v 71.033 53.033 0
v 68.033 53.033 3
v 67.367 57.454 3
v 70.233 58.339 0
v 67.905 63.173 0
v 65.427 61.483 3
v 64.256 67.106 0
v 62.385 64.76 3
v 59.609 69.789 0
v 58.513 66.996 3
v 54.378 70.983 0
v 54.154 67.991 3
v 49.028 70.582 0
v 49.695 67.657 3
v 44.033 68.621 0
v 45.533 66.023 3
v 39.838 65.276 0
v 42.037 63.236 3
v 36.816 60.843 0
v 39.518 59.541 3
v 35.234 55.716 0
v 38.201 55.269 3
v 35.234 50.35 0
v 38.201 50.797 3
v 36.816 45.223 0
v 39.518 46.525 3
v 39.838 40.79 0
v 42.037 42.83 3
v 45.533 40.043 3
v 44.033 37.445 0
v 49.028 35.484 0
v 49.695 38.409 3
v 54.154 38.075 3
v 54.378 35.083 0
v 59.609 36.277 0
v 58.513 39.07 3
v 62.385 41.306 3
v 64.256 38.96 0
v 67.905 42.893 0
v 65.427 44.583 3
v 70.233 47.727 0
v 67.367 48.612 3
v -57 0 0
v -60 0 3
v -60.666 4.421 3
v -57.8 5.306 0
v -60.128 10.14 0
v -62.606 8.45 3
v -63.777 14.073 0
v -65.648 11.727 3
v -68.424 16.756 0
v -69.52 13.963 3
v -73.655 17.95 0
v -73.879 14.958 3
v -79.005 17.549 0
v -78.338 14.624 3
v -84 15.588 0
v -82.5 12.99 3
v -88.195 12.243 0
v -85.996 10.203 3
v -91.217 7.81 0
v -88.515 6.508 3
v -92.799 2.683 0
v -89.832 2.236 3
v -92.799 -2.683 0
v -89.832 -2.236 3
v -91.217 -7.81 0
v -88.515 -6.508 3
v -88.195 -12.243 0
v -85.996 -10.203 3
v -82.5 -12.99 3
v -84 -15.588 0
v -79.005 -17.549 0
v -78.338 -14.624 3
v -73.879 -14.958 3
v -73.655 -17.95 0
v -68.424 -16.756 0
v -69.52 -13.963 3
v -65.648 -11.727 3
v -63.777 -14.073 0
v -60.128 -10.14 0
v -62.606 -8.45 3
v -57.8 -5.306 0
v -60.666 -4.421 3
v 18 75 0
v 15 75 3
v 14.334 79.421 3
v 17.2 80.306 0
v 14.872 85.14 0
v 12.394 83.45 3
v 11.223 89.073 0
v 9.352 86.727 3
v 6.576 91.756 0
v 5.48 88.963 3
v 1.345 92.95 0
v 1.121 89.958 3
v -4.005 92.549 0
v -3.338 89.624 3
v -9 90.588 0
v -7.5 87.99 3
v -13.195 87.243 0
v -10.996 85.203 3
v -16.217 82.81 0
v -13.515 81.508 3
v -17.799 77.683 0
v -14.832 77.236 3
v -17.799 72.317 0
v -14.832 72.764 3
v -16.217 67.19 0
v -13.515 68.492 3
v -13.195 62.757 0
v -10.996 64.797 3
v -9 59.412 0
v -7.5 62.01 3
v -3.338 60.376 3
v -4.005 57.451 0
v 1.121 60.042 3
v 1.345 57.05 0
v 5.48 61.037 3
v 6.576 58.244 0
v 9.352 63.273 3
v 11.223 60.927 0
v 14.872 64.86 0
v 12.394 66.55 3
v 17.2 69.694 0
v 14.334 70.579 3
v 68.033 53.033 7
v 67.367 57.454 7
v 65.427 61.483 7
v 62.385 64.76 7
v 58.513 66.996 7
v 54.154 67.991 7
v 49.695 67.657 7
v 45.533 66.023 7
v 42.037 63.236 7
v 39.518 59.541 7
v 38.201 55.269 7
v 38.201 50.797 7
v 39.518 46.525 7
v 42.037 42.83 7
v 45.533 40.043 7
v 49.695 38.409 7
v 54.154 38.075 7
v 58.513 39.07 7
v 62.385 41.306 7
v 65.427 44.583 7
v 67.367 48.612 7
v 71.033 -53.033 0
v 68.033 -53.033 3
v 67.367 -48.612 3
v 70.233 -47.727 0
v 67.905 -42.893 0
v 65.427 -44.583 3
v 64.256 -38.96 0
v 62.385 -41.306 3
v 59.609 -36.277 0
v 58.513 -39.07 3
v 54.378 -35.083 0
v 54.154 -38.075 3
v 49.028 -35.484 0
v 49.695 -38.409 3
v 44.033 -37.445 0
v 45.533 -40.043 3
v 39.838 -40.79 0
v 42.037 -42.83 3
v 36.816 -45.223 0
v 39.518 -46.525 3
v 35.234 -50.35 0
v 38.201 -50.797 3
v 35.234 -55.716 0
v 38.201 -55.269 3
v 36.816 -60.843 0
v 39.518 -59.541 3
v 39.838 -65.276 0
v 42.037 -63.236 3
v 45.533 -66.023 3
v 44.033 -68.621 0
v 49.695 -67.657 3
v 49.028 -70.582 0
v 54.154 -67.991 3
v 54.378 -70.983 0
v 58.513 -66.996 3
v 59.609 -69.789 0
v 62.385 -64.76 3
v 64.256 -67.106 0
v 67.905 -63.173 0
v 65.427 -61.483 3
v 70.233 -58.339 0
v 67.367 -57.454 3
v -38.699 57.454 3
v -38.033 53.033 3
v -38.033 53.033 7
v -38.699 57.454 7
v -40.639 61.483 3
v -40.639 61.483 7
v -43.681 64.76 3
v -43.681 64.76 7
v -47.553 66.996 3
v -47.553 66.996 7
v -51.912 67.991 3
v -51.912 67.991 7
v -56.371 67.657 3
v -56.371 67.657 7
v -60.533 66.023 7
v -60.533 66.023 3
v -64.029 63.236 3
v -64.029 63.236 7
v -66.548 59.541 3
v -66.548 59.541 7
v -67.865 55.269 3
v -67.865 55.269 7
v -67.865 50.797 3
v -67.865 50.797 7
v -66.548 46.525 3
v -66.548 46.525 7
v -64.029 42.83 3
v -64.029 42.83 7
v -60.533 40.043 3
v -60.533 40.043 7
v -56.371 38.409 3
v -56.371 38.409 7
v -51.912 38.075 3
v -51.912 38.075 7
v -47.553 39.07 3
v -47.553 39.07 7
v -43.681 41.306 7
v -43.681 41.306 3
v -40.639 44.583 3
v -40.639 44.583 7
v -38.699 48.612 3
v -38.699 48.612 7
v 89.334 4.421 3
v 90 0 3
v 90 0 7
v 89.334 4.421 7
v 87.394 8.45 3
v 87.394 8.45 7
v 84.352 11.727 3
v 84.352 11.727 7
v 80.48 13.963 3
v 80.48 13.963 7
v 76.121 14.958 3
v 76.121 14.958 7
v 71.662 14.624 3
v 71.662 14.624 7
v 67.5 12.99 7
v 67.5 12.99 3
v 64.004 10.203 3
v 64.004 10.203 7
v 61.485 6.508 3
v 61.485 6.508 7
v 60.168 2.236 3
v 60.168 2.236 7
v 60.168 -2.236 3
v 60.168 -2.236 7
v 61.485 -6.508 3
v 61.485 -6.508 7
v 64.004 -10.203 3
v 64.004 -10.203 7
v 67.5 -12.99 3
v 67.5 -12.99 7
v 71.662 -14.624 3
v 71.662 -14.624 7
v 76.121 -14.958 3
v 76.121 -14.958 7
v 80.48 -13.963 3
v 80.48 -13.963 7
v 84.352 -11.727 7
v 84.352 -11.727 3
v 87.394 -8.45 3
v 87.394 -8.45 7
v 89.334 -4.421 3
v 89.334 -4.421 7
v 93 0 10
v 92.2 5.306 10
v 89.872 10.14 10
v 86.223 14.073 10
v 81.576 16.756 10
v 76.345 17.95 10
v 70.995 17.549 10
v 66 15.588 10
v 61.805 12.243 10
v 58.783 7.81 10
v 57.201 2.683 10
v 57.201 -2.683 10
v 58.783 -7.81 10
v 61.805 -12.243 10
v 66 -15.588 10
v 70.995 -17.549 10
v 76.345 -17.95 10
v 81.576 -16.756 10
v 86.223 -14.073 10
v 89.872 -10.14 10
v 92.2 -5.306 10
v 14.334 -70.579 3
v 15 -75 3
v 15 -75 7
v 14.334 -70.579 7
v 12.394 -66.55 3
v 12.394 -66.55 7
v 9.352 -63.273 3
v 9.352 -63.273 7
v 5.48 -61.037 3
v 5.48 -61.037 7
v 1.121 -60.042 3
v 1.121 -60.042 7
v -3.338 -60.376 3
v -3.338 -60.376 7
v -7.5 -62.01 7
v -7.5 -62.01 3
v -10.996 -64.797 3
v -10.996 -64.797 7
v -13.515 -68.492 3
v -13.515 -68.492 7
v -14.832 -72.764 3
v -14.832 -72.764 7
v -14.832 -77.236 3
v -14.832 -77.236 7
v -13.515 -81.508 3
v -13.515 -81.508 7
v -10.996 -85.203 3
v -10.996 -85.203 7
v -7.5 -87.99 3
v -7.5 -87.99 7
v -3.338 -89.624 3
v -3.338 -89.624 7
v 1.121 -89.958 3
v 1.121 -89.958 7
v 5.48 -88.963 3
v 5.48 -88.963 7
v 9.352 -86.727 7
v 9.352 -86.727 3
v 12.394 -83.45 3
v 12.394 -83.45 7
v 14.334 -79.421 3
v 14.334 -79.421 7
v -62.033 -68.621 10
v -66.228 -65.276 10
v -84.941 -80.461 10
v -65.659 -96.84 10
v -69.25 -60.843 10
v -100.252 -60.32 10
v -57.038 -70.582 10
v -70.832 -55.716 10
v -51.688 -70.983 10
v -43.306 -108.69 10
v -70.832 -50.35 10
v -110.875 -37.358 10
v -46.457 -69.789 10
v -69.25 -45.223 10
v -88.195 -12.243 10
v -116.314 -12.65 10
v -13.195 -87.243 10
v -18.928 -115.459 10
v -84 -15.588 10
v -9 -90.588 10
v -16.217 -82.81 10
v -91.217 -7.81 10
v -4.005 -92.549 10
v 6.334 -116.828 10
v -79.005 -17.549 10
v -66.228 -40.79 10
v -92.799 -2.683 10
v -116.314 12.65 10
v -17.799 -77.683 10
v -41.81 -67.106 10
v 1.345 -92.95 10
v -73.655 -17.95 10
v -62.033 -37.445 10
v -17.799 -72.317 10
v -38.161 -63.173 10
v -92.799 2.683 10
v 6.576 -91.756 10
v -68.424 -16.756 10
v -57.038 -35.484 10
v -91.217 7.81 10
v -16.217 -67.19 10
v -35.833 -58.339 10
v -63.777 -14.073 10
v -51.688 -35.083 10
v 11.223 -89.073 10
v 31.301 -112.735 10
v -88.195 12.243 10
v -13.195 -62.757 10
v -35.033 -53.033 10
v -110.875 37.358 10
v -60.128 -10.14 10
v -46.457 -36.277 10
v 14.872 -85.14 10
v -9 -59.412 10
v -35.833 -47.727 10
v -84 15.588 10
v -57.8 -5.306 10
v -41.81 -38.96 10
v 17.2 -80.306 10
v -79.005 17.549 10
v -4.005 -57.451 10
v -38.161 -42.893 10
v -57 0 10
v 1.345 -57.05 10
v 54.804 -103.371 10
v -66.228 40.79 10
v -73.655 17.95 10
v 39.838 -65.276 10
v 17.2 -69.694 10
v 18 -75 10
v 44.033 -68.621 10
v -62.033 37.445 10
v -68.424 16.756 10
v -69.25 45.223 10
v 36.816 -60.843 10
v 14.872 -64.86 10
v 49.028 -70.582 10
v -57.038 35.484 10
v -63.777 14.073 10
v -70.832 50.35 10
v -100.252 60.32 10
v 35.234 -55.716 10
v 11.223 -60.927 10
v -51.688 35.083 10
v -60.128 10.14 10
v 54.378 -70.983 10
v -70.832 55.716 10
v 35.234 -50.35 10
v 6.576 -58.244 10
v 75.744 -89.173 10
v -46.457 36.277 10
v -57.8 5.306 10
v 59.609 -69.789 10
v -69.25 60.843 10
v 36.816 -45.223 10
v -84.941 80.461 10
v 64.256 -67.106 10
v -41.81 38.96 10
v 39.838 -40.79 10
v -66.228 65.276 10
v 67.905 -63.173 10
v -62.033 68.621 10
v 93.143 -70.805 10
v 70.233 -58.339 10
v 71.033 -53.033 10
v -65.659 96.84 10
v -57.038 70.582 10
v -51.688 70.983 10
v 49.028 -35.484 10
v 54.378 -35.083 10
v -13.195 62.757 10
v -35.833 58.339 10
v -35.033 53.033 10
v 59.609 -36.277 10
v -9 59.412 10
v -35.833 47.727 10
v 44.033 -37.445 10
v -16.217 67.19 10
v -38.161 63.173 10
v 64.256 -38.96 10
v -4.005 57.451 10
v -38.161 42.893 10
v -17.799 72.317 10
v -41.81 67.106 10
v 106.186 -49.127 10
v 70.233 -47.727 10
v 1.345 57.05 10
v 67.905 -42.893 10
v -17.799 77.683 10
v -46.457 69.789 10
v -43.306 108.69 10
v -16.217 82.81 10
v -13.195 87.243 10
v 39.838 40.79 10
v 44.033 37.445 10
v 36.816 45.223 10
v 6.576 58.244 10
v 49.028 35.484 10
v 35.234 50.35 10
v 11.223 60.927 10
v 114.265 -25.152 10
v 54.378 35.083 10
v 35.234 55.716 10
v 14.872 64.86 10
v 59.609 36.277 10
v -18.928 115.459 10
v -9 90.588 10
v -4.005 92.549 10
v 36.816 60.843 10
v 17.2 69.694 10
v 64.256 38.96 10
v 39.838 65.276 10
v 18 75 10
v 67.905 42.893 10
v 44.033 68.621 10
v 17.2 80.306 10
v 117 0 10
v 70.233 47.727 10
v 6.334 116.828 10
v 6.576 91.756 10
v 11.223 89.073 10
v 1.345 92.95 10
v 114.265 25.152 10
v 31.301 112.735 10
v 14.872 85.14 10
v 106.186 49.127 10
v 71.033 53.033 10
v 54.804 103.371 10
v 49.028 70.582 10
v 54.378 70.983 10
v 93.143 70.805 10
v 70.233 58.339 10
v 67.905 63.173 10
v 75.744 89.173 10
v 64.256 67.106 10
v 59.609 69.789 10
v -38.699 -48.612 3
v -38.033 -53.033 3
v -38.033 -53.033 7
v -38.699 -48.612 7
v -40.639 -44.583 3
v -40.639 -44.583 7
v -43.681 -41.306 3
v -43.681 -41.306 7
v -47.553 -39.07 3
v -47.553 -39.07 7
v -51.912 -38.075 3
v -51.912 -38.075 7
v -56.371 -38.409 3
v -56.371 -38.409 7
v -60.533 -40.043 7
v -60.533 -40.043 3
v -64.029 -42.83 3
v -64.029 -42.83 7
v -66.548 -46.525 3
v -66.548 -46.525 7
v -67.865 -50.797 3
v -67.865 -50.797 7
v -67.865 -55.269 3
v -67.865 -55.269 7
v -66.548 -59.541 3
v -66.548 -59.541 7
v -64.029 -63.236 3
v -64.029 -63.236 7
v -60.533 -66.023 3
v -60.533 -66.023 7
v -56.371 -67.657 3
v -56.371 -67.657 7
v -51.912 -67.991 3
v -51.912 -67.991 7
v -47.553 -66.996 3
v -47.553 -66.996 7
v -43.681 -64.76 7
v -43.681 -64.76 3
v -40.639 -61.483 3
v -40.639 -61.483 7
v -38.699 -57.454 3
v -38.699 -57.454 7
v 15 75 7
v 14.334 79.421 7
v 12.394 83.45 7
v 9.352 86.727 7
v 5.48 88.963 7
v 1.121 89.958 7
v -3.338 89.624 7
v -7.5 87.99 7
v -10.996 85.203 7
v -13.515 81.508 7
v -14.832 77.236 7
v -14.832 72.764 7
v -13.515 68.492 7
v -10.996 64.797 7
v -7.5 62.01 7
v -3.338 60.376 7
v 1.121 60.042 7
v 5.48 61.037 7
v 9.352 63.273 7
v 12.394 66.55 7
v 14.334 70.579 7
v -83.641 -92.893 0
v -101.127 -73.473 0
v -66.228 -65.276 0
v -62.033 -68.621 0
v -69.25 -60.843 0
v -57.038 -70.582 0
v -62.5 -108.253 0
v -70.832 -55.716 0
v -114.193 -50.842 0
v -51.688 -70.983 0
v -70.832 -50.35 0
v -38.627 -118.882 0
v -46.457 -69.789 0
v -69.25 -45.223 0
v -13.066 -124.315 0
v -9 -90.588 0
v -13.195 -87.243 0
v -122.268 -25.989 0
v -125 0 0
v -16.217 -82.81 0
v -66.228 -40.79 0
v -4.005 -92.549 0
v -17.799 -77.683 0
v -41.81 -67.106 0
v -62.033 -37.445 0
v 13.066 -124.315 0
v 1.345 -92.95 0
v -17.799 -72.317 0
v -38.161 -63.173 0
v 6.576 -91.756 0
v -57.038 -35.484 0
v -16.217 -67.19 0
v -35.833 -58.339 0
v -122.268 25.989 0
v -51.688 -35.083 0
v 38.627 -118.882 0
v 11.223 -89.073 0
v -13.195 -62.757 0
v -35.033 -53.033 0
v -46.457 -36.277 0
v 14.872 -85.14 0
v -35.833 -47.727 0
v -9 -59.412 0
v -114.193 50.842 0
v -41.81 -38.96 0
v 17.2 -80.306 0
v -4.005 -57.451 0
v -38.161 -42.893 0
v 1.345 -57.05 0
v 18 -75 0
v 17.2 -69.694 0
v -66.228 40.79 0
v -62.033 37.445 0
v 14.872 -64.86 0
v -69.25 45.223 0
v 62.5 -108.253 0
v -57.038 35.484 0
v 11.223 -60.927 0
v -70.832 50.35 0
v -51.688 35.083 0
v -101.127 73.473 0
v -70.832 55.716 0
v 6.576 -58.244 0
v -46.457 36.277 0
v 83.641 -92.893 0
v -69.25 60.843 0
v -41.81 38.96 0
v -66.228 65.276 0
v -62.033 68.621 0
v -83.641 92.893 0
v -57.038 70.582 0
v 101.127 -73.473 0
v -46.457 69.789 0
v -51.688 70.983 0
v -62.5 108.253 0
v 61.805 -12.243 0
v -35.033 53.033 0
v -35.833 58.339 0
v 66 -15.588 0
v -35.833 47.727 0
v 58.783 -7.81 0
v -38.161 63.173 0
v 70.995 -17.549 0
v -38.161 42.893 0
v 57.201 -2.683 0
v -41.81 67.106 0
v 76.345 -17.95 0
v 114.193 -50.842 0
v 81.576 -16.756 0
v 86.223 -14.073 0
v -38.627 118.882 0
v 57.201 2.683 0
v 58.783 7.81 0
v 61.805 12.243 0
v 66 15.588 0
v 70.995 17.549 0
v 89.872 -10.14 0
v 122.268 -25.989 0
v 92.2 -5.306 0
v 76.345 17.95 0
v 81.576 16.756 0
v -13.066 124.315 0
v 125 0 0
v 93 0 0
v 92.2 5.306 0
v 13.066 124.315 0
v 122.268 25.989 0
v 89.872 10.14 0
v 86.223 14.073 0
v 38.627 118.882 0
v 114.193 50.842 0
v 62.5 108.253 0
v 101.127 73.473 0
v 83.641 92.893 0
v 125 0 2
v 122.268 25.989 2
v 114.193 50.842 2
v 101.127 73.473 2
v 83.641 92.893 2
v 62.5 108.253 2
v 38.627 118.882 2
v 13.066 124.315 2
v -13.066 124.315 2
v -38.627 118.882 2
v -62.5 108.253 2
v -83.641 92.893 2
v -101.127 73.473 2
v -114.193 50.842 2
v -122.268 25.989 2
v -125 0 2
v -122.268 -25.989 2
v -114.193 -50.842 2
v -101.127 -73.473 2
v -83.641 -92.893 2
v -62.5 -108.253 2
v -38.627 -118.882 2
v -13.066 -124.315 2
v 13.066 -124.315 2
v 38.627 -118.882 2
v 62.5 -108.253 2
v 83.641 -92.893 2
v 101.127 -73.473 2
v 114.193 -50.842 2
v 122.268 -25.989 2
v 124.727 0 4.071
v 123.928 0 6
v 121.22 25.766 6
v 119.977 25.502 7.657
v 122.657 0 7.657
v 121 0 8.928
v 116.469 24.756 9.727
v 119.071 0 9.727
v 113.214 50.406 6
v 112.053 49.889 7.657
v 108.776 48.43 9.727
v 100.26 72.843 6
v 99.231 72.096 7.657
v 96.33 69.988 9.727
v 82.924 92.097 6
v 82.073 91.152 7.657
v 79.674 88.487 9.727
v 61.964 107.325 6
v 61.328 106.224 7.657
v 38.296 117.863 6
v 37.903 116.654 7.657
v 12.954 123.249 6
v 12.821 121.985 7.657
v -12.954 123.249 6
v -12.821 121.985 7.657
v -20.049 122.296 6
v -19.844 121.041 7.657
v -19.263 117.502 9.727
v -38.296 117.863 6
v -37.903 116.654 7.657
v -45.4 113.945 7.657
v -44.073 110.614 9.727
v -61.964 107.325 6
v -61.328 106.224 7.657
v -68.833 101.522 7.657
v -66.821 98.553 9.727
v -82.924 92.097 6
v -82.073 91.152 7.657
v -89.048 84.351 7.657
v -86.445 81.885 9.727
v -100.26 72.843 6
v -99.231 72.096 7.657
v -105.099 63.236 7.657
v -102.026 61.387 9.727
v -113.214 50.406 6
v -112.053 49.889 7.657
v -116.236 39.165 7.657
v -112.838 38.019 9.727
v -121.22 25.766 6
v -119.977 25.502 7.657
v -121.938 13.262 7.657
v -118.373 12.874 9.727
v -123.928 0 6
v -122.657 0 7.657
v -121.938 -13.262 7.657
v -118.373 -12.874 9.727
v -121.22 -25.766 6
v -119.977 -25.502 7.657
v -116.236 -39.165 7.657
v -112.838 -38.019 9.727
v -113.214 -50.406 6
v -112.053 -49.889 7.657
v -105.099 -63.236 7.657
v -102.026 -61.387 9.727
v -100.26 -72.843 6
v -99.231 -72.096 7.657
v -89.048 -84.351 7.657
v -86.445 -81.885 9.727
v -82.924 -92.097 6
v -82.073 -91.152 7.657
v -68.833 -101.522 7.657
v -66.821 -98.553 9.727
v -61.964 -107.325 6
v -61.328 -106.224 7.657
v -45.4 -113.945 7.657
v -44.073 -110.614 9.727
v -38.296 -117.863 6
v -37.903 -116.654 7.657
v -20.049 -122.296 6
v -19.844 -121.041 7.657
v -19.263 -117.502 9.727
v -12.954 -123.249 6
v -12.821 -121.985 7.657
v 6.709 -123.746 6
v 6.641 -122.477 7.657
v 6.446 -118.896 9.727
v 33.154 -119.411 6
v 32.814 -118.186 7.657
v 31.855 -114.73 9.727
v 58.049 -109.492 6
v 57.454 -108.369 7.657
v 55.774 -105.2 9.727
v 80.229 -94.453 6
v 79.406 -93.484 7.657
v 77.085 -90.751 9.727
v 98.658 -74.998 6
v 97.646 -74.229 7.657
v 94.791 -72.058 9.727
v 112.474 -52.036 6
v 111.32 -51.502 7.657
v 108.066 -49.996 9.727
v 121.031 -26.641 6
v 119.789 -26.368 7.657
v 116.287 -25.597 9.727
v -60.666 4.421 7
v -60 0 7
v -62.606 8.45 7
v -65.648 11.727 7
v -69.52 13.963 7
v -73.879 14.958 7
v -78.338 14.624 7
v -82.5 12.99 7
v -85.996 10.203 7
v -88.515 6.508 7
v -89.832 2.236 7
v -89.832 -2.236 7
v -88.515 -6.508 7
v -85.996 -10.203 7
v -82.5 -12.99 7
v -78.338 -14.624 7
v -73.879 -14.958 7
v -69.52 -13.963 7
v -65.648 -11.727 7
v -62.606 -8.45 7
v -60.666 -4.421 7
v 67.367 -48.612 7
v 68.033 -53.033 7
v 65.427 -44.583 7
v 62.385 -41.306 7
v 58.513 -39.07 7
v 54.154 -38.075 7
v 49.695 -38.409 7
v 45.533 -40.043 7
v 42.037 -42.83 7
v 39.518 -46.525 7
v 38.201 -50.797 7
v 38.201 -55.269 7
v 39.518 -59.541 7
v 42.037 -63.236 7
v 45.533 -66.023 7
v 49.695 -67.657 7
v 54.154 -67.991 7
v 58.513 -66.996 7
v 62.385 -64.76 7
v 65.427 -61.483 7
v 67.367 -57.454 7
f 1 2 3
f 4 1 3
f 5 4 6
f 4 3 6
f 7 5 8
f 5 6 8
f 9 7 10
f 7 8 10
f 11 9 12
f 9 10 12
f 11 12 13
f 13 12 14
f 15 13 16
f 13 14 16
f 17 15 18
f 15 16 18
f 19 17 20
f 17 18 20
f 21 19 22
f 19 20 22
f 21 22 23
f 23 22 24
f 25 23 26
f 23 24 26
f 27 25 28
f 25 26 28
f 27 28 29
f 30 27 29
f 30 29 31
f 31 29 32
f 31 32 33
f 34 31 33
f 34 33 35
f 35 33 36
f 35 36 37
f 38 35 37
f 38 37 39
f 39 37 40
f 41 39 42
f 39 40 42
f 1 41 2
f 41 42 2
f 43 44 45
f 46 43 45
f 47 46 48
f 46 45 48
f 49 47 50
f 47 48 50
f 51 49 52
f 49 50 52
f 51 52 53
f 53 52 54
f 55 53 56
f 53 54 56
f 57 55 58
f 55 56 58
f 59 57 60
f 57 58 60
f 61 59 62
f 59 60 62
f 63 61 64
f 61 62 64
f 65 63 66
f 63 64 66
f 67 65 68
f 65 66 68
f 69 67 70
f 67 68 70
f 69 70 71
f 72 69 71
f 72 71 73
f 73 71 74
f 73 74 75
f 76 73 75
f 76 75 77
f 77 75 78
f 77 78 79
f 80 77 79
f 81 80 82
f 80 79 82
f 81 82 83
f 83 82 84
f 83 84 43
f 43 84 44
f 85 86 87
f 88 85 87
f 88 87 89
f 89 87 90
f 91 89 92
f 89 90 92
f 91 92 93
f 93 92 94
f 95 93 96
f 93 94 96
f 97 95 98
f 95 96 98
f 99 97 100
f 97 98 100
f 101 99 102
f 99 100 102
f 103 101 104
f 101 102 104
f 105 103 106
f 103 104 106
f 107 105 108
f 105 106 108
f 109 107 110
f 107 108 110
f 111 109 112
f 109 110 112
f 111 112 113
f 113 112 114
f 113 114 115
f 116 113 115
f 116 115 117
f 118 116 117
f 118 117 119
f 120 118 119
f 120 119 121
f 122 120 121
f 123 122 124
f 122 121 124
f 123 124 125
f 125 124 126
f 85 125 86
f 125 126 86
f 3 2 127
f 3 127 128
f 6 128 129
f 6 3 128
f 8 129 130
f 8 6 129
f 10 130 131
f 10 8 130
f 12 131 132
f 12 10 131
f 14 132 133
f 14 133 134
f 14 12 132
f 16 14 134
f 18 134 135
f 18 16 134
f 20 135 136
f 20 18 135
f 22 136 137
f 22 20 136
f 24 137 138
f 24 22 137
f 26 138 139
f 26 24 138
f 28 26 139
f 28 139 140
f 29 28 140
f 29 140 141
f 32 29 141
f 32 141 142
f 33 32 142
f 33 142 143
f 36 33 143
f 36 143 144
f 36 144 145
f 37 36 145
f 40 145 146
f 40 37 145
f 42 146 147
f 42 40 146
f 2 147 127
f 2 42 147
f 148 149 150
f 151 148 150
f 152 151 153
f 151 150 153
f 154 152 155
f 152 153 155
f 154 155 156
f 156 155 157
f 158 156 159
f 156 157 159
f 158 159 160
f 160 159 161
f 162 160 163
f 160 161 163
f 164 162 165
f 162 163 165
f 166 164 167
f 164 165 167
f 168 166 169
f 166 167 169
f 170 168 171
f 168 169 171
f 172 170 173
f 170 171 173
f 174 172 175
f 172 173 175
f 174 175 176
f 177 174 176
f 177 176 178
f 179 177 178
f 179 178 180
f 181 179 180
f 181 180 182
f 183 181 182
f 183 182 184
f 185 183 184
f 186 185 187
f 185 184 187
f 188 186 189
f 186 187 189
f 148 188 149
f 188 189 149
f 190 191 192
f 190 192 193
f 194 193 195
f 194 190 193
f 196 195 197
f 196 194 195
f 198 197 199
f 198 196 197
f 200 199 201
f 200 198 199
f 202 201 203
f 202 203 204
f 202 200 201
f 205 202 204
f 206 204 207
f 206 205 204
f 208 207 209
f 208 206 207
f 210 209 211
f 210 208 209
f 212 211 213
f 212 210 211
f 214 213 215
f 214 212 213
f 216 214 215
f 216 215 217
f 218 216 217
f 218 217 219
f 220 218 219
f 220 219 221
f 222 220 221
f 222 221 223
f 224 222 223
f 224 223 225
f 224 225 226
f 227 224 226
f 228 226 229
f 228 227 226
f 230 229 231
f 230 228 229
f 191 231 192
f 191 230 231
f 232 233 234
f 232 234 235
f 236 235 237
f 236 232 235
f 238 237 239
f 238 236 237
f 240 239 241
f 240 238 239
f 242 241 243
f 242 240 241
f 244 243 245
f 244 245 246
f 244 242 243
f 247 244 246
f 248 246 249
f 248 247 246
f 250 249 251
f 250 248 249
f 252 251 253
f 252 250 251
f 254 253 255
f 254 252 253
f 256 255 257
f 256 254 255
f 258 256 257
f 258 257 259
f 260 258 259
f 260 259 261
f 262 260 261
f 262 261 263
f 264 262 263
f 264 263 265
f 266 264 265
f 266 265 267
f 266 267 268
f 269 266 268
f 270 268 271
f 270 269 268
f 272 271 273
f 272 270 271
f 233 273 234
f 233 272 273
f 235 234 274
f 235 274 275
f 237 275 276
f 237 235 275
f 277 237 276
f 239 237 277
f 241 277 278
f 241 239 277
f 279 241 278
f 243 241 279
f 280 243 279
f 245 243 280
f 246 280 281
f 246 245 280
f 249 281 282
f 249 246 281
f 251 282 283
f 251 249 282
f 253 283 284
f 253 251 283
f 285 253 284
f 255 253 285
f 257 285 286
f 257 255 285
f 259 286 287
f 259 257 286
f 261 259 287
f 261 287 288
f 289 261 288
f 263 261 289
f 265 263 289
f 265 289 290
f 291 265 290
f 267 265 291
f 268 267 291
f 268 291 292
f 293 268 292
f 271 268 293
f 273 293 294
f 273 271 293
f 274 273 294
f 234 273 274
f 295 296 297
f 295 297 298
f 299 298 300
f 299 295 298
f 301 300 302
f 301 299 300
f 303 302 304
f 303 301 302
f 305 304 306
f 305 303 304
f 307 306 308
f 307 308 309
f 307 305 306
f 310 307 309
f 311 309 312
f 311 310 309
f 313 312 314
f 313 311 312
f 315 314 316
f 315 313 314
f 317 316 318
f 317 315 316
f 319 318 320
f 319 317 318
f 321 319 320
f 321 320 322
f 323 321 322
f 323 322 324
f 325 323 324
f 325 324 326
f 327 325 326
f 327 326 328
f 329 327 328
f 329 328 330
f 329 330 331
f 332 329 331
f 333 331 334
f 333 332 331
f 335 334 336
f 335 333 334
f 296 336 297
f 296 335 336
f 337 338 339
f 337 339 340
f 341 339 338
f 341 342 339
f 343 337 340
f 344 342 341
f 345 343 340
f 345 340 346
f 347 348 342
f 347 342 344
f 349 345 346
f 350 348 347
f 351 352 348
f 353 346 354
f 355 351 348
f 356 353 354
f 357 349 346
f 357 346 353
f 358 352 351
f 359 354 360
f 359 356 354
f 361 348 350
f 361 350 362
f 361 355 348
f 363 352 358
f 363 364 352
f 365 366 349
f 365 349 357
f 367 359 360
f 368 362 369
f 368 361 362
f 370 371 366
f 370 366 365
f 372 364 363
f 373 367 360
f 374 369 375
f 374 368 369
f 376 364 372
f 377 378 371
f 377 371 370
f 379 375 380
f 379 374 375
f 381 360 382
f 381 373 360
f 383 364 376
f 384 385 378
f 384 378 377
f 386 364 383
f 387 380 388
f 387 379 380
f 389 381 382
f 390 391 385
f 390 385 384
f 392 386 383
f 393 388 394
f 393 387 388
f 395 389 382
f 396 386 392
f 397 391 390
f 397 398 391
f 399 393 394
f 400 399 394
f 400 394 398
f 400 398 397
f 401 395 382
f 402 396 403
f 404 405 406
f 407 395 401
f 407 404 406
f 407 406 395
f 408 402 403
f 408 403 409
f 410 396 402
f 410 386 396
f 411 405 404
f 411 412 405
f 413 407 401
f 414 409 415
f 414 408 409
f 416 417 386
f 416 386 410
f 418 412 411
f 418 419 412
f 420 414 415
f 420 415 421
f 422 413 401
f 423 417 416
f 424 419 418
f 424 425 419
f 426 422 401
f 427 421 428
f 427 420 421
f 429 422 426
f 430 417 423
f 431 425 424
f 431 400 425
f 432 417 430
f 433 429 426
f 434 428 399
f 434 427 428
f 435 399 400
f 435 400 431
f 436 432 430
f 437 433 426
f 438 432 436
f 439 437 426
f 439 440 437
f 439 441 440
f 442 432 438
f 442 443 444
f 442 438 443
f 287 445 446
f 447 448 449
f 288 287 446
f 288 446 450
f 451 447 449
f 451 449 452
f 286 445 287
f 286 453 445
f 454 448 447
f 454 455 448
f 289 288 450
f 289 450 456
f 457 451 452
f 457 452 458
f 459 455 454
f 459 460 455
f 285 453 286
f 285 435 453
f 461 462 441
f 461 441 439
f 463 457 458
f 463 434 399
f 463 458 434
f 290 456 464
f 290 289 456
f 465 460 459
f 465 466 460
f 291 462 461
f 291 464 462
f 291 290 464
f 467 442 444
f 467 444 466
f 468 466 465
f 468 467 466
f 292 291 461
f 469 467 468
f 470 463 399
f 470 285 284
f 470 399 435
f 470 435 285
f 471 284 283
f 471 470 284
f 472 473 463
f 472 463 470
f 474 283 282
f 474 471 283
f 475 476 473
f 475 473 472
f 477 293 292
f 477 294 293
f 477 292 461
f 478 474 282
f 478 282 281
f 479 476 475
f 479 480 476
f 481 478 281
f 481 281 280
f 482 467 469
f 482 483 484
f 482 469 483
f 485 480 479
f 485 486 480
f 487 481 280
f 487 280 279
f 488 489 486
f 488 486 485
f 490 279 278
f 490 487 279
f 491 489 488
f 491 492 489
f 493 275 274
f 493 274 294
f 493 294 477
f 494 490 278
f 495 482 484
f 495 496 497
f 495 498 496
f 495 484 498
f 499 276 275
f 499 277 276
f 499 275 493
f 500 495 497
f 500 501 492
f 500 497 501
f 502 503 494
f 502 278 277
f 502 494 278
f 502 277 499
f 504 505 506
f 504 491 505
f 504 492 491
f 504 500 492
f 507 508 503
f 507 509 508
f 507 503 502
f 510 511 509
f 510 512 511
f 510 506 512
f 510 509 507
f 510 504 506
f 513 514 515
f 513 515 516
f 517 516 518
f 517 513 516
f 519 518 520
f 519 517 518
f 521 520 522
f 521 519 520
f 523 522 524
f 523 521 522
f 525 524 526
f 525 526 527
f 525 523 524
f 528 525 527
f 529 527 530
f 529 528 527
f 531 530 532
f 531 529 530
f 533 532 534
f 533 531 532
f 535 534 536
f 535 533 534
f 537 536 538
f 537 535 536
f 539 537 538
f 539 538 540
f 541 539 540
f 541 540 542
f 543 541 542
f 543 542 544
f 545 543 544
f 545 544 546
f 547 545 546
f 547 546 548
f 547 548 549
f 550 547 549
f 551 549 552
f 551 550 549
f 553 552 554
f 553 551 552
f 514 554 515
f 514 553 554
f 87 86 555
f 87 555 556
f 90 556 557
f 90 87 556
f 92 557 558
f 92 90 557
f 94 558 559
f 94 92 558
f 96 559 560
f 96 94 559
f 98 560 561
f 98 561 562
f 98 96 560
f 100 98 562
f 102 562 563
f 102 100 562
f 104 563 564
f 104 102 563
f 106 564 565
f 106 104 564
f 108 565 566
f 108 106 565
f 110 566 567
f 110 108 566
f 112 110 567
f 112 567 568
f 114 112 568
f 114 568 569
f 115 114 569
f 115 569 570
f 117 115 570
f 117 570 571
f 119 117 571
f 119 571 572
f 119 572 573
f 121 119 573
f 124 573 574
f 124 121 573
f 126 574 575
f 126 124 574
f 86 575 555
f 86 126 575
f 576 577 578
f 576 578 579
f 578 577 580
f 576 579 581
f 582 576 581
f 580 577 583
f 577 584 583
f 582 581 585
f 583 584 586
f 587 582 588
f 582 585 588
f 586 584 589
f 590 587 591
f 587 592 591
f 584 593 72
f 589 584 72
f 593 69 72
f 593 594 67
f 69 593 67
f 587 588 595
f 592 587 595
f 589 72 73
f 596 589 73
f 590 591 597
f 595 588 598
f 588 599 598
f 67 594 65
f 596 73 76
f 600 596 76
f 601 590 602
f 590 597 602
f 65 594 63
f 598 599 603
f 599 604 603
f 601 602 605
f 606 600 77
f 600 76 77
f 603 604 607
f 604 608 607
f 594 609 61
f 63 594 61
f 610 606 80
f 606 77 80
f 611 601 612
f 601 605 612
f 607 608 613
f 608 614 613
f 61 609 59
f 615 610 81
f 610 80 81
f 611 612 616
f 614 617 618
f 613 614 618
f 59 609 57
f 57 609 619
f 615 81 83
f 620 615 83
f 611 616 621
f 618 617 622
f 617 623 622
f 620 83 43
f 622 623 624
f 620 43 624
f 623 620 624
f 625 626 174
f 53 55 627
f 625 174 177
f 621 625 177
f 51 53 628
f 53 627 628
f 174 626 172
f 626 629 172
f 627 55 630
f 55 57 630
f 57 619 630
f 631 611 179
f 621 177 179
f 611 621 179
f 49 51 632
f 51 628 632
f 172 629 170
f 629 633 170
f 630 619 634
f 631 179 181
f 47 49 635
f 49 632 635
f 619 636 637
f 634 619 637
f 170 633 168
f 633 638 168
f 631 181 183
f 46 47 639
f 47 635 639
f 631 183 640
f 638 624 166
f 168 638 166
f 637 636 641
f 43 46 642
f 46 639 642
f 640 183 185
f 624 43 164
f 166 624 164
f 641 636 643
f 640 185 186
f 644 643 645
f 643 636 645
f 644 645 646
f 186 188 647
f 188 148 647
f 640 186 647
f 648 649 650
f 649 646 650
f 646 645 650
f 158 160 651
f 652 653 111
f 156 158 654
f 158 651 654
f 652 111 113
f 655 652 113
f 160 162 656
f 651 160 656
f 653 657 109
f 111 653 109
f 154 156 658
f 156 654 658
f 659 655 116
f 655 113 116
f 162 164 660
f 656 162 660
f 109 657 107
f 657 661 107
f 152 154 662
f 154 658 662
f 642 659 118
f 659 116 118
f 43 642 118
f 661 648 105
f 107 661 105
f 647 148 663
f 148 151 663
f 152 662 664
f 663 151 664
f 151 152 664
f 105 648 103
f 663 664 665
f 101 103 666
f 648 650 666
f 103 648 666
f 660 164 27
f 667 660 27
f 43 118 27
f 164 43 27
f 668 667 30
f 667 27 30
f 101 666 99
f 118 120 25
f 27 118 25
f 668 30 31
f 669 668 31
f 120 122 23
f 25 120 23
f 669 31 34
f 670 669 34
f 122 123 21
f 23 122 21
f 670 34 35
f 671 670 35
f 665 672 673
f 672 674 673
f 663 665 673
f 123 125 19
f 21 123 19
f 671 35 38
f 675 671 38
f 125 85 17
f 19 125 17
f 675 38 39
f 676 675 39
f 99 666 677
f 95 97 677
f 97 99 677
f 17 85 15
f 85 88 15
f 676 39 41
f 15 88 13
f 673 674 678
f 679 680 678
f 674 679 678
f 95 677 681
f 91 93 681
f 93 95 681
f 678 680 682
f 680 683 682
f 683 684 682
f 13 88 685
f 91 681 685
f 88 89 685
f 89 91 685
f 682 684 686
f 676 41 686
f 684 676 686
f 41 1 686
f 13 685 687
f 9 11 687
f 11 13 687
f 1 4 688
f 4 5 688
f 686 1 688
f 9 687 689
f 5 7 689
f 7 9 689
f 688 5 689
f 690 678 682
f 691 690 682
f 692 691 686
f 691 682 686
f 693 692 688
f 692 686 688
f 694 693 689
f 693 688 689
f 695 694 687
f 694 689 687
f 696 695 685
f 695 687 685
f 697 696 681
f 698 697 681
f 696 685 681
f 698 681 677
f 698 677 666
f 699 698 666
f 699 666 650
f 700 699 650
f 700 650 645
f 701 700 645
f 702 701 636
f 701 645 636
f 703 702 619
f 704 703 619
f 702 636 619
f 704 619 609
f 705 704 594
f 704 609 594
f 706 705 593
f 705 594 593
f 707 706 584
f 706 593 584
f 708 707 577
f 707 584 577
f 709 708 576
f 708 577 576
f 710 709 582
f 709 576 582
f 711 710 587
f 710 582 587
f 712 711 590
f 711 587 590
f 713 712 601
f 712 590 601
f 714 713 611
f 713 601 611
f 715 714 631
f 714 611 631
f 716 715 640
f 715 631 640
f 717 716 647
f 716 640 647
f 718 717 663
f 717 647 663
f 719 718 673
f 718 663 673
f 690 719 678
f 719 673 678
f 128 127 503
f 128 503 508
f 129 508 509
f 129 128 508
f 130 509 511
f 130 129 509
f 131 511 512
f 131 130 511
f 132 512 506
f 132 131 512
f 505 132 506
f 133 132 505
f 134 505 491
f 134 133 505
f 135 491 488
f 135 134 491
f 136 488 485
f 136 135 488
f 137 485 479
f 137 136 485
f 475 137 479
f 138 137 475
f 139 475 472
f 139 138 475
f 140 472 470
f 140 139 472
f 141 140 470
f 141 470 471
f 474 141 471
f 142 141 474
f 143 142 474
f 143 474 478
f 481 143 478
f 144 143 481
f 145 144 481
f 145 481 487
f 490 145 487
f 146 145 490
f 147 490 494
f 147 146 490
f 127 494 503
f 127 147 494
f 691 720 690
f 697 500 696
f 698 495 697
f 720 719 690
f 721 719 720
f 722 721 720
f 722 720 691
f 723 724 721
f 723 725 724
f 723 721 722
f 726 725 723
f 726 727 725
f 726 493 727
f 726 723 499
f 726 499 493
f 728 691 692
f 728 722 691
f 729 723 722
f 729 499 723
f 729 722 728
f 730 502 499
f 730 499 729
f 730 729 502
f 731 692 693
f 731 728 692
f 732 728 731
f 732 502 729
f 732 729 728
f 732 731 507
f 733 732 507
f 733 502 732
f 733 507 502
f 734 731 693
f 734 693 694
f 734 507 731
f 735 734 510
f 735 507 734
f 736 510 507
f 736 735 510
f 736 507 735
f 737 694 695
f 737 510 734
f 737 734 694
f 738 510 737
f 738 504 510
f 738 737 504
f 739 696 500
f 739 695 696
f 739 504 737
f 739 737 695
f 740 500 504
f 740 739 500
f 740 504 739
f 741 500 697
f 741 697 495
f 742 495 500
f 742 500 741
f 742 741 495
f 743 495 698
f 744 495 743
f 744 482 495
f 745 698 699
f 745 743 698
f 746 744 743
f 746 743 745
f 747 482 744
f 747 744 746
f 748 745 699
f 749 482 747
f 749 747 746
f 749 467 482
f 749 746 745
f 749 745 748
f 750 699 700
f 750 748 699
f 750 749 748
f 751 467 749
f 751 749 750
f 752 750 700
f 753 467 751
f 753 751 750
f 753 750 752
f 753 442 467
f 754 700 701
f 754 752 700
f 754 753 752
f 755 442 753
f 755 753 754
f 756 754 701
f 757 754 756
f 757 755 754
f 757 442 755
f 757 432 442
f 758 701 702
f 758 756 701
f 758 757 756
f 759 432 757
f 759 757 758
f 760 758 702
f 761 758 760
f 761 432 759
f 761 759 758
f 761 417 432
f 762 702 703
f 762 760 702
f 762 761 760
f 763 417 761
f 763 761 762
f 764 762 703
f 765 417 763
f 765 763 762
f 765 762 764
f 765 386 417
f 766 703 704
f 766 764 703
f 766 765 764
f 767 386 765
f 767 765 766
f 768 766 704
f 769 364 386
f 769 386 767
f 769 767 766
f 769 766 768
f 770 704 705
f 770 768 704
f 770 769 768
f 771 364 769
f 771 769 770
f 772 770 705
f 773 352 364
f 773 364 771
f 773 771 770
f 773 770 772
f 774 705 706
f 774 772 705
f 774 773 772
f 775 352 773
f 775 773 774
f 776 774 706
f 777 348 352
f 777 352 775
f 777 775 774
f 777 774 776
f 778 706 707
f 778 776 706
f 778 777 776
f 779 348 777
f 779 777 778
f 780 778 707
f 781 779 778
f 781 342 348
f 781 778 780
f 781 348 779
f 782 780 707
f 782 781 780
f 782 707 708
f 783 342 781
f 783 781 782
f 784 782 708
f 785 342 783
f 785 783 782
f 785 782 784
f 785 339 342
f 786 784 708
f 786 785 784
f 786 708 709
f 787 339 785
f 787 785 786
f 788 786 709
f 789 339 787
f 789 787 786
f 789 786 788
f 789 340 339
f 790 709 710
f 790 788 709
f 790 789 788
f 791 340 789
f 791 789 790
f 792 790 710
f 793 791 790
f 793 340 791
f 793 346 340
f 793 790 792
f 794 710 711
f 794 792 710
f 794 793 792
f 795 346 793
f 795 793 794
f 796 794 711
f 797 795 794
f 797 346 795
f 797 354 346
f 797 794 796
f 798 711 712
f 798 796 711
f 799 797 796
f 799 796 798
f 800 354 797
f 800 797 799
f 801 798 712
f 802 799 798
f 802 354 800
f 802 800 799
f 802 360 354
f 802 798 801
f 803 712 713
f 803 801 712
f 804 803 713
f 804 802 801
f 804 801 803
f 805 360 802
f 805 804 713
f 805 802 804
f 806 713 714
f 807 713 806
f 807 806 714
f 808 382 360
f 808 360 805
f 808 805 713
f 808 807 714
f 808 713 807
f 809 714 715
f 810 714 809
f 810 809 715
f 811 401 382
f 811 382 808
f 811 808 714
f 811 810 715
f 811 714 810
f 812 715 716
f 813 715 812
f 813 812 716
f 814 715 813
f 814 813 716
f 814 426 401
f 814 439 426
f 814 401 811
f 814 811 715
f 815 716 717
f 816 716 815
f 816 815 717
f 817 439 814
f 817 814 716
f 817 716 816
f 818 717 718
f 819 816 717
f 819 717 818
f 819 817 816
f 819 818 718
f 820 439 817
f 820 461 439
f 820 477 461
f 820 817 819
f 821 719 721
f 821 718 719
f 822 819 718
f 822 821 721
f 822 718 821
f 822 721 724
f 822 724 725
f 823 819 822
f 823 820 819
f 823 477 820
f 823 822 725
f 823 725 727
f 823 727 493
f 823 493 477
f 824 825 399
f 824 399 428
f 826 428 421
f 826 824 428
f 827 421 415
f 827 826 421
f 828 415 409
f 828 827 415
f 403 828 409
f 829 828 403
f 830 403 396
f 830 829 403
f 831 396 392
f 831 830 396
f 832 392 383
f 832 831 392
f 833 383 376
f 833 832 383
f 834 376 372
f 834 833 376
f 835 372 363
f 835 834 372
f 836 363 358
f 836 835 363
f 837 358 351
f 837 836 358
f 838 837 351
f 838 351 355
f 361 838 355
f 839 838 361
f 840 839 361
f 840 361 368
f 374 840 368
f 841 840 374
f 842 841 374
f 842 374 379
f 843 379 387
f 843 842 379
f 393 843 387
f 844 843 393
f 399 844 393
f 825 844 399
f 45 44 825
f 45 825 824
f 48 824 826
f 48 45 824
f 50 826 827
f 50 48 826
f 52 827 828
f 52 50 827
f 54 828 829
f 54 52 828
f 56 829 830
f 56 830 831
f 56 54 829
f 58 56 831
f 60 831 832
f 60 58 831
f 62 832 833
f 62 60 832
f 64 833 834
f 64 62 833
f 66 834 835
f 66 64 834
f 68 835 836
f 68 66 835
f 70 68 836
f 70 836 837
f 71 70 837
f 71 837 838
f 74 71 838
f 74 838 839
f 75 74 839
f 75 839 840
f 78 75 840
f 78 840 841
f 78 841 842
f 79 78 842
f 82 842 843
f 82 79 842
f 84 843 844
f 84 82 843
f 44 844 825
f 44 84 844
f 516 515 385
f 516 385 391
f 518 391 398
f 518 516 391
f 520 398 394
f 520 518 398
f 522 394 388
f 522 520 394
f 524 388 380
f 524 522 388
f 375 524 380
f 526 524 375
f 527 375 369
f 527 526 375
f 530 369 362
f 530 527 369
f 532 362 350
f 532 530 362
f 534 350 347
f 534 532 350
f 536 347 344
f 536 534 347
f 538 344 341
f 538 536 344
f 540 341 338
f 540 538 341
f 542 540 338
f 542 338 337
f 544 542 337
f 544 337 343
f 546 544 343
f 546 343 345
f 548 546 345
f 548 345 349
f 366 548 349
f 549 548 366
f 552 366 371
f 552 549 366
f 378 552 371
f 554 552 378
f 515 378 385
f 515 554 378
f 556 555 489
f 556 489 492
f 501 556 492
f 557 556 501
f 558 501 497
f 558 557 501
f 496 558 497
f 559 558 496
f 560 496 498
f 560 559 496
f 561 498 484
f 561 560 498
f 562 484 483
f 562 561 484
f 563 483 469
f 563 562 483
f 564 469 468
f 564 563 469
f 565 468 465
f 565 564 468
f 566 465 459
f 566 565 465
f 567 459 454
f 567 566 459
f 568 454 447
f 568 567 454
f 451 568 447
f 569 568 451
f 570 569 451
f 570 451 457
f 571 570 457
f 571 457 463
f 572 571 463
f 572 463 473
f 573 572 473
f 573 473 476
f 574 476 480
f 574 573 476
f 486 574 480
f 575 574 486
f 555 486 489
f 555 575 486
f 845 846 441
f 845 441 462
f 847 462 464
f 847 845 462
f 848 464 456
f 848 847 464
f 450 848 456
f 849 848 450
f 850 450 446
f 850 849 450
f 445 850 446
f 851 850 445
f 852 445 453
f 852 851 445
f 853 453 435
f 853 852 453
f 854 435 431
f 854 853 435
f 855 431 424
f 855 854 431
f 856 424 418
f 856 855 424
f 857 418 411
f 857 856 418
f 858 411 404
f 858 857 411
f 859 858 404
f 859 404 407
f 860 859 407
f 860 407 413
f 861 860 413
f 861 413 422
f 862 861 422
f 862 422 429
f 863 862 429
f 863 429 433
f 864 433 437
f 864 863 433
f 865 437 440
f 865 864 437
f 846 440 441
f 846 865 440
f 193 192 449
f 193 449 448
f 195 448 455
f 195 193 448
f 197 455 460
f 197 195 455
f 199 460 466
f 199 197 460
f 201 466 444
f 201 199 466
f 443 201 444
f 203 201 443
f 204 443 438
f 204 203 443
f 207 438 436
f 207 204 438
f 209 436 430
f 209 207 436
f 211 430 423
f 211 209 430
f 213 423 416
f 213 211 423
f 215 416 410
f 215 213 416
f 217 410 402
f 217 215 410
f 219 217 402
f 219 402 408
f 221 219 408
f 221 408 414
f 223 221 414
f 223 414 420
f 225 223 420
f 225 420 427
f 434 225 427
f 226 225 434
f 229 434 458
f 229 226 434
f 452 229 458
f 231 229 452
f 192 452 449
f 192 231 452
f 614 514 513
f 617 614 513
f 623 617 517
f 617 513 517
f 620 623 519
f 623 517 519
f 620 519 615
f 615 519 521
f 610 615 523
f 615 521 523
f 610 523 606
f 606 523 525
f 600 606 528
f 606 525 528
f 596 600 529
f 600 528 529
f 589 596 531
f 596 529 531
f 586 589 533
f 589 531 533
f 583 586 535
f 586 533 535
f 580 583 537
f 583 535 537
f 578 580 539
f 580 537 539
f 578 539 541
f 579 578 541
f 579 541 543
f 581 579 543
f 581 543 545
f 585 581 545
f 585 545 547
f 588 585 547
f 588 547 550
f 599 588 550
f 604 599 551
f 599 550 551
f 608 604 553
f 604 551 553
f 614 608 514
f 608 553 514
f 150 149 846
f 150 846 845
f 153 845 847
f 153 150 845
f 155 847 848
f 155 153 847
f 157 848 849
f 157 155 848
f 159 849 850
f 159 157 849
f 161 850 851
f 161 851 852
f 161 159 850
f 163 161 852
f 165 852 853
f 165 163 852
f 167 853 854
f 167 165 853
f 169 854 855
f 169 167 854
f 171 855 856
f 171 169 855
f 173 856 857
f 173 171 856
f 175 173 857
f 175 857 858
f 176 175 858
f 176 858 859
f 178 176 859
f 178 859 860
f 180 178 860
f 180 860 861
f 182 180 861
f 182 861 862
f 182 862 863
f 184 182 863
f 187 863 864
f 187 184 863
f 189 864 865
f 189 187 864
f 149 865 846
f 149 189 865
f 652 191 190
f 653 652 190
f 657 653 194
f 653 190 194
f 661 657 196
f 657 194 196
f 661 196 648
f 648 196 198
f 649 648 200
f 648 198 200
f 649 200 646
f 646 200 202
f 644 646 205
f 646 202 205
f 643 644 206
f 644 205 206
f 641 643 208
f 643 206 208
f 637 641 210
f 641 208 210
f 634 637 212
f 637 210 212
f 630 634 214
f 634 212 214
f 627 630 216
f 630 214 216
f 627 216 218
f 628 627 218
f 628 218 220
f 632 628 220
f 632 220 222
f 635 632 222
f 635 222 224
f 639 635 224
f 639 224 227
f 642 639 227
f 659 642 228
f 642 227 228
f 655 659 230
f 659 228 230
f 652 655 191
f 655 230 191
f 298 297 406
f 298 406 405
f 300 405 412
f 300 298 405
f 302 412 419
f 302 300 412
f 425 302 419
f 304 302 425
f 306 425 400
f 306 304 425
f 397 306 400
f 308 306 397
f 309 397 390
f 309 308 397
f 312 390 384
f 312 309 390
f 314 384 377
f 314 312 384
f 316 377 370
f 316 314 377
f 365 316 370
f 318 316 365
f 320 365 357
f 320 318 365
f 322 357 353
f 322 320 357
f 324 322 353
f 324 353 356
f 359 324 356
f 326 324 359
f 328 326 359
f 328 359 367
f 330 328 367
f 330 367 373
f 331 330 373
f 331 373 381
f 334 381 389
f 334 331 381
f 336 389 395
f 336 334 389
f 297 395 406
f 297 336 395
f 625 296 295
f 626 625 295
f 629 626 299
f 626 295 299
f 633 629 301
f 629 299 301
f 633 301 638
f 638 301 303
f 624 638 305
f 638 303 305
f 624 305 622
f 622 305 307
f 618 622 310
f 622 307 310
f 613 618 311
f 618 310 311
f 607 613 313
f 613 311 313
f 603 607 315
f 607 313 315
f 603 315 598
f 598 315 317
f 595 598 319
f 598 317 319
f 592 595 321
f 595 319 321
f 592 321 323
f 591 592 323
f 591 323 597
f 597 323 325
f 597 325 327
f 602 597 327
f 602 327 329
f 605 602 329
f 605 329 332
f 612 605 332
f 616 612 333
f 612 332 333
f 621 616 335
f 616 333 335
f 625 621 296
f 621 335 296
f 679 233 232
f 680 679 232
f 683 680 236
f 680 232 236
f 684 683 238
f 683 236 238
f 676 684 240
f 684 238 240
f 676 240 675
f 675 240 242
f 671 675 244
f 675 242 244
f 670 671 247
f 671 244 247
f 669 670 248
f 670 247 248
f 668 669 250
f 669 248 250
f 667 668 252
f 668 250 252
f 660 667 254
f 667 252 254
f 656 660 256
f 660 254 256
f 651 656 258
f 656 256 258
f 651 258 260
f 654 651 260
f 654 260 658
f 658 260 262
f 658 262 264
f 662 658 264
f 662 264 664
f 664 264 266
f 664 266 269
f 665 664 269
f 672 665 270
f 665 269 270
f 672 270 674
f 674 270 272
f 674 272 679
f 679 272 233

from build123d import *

# Parameters (mm, degrees)
F1_R     = 125
F1_R_2   = 15
F2_DEPTH = 10
F3_R     = 8
F4_SIZE  = 3


with BuildPart() as f2:
    # F1 (on face) → F2 (new body)
    with BuildSketch(Plane.XY):
        Circle(F1_R)
        with Locations((-53.033009, -53.033009)):
            Circle(F1_R_2, mode=Mode.SUBTRACT)
        with Locations((0, -75)):
            Circle(F1_R_2, mode=Mode.SUBTRACT)
        with Locations((53.033009, -53.033009)):
            Circle(F1_R_2, mode=Mode.SUBTRACT)
        with Locations((-75, 0)):
            Circle(F1_R_2, mode=Mode.SUBTRACT)
        with Locations((-53.033009, 53.033009)):
            Circle(F1_R_2, mode=Mode.SUBTRACT)
        with Locations((53.033009, 53.033009)):
            Circle(F1_R_2, mode=Mode.SUBTRACT)
        with Locations((75, 0)):
            Circle(F1_R_2, mode=Mode.SUBTRACT)
        with Locations((0, 75)):
            Circle(F1_R_2, mode=Mode.SUBTRACT)
    extrude(amount=F2_DEPTH)

    # F3
    f3_edges = [f2.edges().sort_by_distance(p)[0] for p in [
        (-125, 0, 10),
    ]]
    fillet(f3_edges, radius=F3_R)

    # F4
    f4_edges = [f2.edges().sort_by_distance(p)[0] for p in [
        (-68.033009, -53.033009, 10),
        (-90, 0, 10),
        (-68.033009, 53.033009, 10),
        (-15, 75, 10),
        (38.033009, 53.033009, 10),
        (60, 0, 10),
        (38.033009, -53.033009, 10),
        (-15, -75, 10),
        (38.033009, -53.033009, 0),
        (60, 0, 0),
        (38.033009, 53.033009, 0),
        (-15, 75, 0),
        (-68.033009, 53.033009, 0),
        (-90, 0, 0),
        (-68.033009, -53.033009, 0),
        (-15, -75, 0),
    ]]
    chamfer(f4_edges, length=F4_SIZE)


solid = f2.part
